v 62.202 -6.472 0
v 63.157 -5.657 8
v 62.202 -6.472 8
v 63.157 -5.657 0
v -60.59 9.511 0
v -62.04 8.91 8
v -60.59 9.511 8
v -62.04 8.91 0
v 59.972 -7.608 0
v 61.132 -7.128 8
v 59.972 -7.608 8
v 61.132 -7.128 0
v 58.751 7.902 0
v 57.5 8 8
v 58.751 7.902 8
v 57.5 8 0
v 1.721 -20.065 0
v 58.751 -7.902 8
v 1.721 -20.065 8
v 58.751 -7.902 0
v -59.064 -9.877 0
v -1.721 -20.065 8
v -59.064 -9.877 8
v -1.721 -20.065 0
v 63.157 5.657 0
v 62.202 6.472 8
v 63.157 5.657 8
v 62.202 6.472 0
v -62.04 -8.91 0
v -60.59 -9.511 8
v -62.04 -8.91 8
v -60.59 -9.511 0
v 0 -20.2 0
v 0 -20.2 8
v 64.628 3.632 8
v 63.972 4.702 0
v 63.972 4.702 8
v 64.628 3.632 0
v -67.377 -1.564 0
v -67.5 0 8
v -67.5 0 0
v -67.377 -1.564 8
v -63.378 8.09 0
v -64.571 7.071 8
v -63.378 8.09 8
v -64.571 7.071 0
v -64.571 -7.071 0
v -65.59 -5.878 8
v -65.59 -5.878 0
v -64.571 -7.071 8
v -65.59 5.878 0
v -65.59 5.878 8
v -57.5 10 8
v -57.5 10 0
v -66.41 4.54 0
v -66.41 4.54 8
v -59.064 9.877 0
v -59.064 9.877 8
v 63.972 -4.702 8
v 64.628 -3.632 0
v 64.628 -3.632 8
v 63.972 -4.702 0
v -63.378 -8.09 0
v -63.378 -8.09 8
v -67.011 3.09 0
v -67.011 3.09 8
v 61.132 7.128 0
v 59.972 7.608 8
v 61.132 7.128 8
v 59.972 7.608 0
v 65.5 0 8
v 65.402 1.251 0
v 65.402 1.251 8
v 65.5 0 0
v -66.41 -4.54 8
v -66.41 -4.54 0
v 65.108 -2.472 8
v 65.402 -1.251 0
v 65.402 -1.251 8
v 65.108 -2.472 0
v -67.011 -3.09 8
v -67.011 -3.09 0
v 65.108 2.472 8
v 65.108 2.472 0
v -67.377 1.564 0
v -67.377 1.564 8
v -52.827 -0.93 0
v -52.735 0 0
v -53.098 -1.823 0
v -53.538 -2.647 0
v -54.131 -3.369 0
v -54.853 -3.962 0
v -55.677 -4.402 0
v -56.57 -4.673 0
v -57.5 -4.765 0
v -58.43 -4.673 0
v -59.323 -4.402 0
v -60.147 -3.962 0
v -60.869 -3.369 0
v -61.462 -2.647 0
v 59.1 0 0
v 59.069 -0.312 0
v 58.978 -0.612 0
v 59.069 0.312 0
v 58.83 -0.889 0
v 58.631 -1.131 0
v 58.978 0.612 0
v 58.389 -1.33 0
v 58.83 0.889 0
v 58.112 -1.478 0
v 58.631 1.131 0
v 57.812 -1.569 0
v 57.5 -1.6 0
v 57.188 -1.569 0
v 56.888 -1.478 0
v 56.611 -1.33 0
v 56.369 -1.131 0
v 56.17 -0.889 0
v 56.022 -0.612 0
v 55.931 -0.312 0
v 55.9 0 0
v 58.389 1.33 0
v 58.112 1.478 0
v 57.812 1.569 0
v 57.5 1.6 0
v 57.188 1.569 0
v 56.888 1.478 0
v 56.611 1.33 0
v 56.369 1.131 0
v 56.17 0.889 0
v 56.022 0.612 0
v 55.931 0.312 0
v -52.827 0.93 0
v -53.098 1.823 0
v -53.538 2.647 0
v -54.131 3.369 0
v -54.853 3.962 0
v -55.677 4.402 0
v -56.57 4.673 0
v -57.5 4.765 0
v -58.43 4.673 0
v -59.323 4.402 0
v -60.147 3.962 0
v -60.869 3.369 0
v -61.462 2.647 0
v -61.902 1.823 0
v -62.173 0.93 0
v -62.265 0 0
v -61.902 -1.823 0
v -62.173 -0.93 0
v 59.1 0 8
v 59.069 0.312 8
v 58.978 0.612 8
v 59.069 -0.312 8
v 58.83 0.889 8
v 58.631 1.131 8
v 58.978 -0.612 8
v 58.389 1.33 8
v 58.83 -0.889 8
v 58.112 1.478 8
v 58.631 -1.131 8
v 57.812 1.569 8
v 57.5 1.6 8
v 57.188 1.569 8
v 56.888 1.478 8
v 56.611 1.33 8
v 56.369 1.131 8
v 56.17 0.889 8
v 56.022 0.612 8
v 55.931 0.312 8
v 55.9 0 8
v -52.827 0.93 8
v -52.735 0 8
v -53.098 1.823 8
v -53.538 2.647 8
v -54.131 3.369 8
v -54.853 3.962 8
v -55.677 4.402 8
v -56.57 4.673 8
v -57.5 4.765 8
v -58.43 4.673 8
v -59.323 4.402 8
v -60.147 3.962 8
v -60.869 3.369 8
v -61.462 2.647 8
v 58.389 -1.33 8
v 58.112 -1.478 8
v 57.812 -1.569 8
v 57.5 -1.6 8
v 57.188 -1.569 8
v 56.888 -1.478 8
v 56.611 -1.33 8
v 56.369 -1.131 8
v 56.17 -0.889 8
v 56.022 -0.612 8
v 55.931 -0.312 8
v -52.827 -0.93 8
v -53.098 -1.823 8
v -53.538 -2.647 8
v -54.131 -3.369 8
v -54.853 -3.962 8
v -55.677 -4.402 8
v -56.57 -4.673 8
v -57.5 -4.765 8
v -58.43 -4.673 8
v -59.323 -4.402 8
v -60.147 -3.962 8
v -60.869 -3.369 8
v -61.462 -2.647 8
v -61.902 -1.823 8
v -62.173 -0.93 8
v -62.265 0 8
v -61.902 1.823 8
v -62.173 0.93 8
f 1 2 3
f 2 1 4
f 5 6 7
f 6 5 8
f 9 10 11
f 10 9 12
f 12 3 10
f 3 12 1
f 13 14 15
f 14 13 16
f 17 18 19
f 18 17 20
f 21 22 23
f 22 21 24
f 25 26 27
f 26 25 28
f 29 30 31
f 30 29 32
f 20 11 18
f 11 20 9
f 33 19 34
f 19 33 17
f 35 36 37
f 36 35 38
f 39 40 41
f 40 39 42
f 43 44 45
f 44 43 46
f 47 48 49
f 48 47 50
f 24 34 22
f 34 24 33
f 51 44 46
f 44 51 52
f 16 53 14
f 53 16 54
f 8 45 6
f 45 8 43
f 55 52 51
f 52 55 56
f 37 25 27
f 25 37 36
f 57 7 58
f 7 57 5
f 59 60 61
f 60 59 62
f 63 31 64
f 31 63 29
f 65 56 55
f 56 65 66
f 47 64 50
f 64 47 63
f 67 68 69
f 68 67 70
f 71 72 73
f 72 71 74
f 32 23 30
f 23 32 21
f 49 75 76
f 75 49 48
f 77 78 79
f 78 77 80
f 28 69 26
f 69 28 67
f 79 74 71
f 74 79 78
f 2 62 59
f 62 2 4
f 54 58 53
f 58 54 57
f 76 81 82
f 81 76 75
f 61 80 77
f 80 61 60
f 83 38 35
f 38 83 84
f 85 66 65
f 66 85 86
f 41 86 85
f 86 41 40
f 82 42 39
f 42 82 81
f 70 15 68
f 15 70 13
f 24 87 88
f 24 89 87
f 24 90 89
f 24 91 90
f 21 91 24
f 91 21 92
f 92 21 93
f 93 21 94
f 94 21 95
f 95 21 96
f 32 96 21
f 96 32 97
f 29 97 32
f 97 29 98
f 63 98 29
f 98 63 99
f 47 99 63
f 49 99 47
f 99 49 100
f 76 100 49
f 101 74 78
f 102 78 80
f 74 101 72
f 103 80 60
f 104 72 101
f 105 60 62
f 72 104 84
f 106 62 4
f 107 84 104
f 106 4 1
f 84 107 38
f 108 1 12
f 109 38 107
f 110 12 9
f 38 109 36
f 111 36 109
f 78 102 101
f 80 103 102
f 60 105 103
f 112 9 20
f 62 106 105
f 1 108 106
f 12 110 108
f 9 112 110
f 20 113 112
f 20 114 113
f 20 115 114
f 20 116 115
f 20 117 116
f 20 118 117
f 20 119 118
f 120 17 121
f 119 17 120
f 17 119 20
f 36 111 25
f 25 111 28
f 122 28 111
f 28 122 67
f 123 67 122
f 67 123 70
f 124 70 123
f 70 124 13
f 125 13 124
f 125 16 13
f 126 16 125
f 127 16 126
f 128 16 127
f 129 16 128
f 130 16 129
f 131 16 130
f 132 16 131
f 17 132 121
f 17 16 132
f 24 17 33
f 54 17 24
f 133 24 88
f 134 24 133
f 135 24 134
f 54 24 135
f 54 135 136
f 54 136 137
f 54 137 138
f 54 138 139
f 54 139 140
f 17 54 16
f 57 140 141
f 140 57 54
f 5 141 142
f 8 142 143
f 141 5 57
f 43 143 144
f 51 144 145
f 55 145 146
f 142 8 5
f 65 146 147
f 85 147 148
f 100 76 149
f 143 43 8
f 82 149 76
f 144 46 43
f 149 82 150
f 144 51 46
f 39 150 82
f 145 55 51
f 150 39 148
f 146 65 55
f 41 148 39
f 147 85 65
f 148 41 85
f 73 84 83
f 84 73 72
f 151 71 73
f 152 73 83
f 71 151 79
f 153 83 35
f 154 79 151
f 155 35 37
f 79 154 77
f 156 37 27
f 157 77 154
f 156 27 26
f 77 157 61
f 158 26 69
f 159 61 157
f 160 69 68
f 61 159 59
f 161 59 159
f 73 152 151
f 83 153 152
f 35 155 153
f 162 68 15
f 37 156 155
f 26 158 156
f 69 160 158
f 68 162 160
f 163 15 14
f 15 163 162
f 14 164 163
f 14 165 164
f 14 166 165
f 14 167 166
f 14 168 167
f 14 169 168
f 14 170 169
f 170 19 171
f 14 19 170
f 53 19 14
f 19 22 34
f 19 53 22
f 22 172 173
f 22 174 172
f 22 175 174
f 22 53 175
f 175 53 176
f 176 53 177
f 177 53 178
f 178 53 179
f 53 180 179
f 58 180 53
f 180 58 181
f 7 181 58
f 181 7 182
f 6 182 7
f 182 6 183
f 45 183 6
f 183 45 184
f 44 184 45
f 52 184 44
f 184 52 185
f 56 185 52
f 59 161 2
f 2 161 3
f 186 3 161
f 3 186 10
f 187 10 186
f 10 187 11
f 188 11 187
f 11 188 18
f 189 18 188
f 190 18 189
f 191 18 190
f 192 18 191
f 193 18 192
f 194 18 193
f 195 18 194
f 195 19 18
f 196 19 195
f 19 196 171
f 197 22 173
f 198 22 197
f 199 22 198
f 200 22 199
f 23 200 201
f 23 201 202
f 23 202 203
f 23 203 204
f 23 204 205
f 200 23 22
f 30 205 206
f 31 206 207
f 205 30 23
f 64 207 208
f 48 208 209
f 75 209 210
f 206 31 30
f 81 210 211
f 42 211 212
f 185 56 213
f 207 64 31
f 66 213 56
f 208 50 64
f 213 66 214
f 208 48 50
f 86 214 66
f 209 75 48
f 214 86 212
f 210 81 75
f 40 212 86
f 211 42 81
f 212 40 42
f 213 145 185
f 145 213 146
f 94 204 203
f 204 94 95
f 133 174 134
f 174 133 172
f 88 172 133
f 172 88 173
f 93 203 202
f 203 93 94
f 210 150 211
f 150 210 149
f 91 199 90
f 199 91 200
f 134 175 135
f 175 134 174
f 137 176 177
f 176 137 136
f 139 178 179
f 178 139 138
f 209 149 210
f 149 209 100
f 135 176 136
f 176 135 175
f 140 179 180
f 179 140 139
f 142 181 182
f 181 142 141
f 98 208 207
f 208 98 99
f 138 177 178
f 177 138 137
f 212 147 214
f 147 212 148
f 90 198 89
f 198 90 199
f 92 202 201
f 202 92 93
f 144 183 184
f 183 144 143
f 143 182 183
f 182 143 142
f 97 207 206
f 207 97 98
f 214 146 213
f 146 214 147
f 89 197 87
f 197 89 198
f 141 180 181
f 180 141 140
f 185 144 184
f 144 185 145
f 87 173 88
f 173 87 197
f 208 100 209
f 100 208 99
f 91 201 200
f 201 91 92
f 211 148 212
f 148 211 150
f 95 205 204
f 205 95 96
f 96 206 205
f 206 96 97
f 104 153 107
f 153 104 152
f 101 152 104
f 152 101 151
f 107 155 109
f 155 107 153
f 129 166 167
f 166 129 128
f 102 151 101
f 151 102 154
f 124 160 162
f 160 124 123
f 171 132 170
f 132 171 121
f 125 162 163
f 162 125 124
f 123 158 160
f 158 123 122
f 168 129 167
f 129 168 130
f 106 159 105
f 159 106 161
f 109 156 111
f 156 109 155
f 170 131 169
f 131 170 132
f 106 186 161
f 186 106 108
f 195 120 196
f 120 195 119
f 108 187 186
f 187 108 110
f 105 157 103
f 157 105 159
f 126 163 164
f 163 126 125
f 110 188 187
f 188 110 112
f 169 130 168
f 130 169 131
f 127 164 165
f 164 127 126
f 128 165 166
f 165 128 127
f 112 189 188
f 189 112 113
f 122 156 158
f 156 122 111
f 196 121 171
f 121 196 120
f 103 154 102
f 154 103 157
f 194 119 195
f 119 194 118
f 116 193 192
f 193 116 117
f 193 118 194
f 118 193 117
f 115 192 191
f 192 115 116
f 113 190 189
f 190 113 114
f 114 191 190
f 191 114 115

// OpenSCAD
$fn = 32;

// ----------------------------------------------------------------------
// Lever: 115 mm between the bosses, 8 mm thick, smooth outline
// ----------------------------------------------------------------------

// --- parameters (mm) ---
lever_l = 115;            // distance between the boss centres
boss_a = 20;              // first boss diameter
boss_b = 16;              // second boss diameter
bore_a = 9.53;            // first bore
bore_b = 3.2;             // second bore
lever_t = 8;              // lever thickness
boss_c = 22;              // middle boss diameter
bend = 9.2;               // how far the middle boss drops

lever_profile = [[-67.5, 0], [-67.377, -1.564], [-67.011, -3.09], [-66.41, -4.54], [-65.59, -5.878], [-64.571, -7.071], [-63.378, -8.09], [-62.04, -8.91], [-60.59, -9.511], [-59.064, -9.877], [-1.721, -20.065], [0, -20.2], [1.721, -20.065], [58.751, -7.902], [59.972, -7.608], [61.132, -7.128], [62.202, -6.472], [63.157, -5.657], [63.972, -4.702], [64.628, -3.632], [65.108, -2.472], [65.402, -1.251], [65.5, 0], [65.402, 1.251], [65.108, 2.472], [64.628, 3.632], [63.972, 4.702], [63.157, 5.657], [62.202, 6.472], [61.132, 7.128], [59.972, 7.608], [58.751, 7.902], [57.5, 8], [-57.5, 10], [-59.064, 9.877], [-60.59, 9.511], [-62.04, 8.91], [-63.378, 8.09], [-64.571, 7.071], [-65.59, 5.878], [-66.41, 4.54], [-67.011, 3.09], [-67.377, 1.564]];

difference() {
  linear_extrude(height = lever_t) polygon(lever_profile);
  translate([-57.5, 0, -2.5]) cylinder(h = lever_t + 5, d = bore_a);
  translate([57.5, 0, -2.5]) cylinder(h = lever_t + 5, d = bore_b);
}
